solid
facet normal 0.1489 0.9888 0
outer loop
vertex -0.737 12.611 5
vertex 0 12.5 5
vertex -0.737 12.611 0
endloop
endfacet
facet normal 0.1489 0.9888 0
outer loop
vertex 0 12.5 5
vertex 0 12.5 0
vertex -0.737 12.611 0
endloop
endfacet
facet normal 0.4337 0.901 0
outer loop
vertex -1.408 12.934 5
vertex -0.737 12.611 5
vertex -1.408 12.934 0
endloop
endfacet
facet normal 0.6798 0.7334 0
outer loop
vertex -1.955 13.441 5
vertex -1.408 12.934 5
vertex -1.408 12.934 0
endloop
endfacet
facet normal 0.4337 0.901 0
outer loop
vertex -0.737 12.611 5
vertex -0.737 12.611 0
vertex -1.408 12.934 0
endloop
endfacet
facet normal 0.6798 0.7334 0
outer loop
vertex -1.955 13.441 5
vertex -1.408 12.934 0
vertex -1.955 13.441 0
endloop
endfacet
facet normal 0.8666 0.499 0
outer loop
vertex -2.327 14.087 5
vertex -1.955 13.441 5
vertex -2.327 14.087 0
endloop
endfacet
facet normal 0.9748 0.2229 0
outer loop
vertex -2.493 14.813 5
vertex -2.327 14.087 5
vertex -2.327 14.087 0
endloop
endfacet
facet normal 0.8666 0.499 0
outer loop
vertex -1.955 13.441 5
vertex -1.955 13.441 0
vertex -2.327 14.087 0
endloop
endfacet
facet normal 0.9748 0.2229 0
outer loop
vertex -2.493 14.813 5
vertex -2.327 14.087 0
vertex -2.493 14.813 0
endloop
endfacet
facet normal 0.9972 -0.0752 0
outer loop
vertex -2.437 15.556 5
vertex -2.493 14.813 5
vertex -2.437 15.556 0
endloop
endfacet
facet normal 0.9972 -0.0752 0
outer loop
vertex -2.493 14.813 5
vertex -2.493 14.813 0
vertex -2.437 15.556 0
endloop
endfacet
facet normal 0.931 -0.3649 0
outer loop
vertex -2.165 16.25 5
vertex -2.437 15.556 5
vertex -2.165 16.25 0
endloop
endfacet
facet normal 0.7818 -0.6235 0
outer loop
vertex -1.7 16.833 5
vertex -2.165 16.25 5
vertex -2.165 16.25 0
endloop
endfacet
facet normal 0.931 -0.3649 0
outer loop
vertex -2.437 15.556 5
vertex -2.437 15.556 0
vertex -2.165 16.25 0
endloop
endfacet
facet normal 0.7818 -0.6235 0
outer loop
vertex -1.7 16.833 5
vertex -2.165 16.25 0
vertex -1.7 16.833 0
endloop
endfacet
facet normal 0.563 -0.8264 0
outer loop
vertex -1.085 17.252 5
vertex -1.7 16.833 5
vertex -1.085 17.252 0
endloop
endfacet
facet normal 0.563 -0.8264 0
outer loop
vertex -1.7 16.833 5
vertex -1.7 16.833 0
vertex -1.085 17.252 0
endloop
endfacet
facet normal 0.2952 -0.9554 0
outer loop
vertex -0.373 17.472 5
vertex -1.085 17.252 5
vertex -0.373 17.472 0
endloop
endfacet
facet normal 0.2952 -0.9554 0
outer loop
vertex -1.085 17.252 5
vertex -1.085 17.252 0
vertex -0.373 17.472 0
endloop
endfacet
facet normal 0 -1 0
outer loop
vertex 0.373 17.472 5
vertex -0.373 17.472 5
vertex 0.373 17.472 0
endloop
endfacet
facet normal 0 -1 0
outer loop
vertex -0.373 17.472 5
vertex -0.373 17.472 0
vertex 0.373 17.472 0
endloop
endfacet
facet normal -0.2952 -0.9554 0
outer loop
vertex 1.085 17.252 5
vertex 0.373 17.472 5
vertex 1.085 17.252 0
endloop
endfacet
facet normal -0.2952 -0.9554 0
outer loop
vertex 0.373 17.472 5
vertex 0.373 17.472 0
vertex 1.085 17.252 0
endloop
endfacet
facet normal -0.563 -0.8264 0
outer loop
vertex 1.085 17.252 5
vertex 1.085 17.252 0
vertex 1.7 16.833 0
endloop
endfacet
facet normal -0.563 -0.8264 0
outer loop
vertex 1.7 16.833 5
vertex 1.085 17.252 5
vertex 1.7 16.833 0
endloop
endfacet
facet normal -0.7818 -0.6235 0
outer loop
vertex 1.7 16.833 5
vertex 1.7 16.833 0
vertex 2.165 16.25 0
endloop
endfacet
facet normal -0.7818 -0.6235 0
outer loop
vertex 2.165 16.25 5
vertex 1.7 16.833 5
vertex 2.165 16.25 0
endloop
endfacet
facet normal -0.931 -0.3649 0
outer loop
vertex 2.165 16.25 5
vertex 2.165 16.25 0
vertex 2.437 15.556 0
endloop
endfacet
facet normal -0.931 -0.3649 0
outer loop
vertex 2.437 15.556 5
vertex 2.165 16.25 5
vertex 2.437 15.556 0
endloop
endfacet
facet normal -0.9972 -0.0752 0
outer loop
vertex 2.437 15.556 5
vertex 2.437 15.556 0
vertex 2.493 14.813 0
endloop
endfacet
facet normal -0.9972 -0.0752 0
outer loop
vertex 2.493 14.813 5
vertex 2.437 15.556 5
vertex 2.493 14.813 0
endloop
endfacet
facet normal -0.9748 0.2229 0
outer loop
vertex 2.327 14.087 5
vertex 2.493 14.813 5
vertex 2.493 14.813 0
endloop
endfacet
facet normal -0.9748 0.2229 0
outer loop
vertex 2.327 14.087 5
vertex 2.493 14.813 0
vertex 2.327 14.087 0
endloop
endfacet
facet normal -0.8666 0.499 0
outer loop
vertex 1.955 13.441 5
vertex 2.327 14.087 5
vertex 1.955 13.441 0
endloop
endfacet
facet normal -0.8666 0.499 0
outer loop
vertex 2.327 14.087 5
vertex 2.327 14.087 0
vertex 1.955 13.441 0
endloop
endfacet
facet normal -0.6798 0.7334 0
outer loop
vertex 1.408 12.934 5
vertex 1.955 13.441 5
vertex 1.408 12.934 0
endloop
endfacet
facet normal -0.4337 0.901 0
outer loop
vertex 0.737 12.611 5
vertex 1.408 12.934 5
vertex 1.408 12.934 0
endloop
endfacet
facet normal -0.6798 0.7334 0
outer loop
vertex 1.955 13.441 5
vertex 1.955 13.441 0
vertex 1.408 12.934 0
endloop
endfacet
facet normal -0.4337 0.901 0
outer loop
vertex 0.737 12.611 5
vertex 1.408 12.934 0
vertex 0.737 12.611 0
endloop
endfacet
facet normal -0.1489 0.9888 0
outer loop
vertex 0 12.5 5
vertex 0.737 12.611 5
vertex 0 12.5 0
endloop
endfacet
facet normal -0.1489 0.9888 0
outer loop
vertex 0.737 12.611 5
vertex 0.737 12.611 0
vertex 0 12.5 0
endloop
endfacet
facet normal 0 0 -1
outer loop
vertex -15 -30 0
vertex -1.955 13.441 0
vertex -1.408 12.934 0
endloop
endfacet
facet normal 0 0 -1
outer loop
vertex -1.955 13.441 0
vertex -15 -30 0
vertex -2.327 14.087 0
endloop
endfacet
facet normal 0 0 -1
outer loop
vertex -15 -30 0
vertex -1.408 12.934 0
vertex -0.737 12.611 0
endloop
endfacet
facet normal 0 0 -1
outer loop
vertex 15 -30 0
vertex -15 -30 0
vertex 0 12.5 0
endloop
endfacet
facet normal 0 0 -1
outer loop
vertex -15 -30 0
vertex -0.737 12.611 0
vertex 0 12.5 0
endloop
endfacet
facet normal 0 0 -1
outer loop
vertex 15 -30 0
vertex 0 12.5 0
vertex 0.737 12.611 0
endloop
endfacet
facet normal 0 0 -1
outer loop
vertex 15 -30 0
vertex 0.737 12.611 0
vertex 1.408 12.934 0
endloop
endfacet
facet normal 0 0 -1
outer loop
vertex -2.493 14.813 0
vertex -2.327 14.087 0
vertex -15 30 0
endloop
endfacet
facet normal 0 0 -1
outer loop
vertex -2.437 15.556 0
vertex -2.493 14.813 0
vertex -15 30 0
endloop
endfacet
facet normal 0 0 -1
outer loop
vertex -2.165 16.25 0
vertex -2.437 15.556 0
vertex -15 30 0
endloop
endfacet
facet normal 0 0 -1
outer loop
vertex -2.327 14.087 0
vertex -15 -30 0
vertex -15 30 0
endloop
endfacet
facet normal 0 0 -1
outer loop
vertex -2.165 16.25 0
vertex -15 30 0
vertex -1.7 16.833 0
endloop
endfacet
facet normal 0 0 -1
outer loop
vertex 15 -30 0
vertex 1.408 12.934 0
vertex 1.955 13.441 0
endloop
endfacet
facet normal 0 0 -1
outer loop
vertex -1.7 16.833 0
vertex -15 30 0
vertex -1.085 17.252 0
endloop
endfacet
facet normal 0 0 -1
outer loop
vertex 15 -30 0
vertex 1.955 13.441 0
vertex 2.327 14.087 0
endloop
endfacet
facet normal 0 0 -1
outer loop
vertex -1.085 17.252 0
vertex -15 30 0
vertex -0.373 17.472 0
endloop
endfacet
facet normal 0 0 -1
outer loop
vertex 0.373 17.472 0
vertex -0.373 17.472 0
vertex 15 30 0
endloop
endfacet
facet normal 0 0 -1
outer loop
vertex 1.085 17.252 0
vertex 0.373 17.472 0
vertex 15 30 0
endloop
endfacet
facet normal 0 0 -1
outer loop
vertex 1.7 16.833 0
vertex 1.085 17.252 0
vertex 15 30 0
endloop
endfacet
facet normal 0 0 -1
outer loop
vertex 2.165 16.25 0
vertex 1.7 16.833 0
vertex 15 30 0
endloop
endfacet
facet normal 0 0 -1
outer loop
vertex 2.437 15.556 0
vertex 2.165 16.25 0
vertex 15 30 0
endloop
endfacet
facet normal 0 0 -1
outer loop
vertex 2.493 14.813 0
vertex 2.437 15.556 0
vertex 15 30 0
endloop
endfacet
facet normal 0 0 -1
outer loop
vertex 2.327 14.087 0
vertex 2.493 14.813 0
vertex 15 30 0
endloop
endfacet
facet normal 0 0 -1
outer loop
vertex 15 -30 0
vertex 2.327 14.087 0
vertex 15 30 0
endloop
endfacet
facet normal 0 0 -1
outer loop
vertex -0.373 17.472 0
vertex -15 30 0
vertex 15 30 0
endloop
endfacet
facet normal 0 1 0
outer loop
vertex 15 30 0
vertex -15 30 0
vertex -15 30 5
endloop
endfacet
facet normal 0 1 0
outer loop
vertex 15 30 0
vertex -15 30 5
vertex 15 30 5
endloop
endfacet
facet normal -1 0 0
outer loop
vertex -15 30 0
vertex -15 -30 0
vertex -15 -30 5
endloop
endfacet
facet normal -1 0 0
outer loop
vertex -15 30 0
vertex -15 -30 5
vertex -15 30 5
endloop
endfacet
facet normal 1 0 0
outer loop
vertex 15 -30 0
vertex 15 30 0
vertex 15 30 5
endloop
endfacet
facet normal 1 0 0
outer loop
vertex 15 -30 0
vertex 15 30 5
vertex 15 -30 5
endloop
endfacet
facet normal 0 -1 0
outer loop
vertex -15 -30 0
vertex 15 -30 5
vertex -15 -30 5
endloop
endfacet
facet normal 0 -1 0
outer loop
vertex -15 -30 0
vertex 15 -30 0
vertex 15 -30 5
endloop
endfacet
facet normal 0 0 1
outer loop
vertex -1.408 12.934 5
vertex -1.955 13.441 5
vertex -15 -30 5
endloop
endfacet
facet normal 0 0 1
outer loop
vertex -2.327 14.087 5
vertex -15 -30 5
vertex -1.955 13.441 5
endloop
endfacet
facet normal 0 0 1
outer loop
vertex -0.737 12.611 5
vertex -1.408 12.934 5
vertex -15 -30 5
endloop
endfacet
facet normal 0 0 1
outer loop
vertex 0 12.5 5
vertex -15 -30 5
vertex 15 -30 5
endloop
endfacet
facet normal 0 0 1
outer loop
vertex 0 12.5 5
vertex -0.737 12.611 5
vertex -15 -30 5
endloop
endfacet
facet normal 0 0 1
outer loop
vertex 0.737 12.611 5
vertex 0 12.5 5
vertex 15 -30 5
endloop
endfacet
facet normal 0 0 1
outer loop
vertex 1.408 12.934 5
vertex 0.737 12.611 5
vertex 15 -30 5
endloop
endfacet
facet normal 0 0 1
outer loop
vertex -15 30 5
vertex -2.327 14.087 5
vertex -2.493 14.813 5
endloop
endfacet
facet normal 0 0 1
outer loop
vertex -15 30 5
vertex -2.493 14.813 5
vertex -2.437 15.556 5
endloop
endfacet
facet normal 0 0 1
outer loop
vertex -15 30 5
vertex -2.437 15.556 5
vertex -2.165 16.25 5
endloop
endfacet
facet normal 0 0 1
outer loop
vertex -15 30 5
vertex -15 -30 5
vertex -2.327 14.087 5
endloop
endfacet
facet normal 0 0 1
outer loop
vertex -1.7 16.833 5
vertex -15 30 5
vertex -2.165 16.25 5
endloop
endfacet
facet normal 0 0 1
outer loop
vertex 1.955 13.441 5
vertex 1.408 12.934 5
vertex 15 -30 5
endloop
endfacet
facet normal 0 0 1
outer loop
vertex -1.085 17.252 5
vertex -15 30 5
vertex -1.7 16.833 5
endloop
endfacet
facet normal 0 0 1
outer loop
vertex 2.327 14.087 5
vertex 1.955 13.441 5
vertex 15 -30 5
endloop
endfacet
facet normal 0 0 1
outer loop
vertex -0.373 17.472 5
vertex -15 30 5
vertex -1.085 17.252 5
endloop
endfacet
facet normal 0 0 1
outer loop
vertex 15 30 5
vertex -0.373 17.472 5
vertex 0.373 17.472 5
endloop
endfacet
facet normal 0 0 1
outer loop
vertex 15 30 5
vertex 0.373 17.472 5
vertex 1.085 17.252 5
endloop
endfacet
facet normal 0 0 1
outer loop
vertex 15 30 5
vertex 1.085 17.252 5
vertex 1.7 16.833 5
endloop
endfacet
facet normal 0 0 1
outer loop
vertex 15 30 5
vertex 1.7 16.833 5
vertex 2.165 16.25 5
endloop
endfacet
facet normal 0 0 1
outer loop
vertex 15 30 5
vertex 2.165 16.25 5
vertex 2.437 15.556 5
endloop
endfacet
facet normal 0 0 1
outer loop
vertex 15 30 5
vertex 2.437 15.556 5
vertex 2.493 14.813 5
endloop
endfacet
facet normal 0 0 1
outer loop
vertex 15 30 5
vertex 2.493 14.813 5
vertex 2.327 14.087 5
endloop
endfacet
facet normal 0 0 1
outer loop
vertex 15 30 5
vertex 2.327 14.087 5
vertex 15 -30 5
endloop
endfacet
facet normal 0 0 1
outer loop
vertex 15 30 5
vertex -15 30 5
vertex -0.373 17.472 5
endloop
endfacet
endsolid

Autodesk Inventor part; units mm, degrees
ref_plane "YZ Plane" through (0, 0, 0) normal (1, 0, 0) x (0, 1, 0)
ref_plane "XZ Plane" through (0, 0, 0) normal (0, 1, 0) x (-1, 0, 0)
ref_plane "XY Plane" through (0, 0, 0) normal (0, 0, 1) x (1, 0, 0)
sketch "Sketch1" plane through (0, 0, 0) normal (0, 0, 1) x (1, 0, 0)
  line L0 (-15, 30) -> (15, 30)
  line L1 (15, 30) -> (15, -30)
  line L2 (15, -30) -> (-15, -30)
  line L3 (-15, -30) -> (-15, 30)
  point P0 (0, 0)
  dimension "d0" = 30
  dimension "d1" = 15
  dimension "d2" = 60
  dimension "d3" = 30
extrude "thickness" add sketch "Sketch1" along normal blind 5
sketch "Sketch2" plane through (0, 0, 5) normal (0, 0, 1) x (1, 0, 0)
  line L0 (-15, -30) -> (15, -30) projected
  point P0 (0, 0)
  point P1 (0, 15)
  dimension "d6" = 45
hole "Hole1" at (0, 15, 5) direction (0, 0, -1) diameter 5 end through all
equation "\"d0\" = sm_varx_squareBarDimension"
equation "\"d1\" = 0.5 * d0"
equation "\"d3\" = 0.5 * d2"
equation "\"d4\" = thickness"
equation "\"d7\" = sm_varx_pinPlate_holeDiameter"
equation "\"sm_varx_squareBarDimension\" = 30"
equation "\"thickness\" = sm_varx_pinPlate_thickness"
equation "\"hoop_angle_z\" = 45deg"
equation "\"hoop_bearing_length\" = 5deg"
equation "\"hoop_cable_diam\" = 5"
equation "\"hoop_cable_pulley_diam\" = 22"
equation "\"rack_tooth_addendum\" = 5"
equation "\"rack_tooth_dedendum\" = 5"
equation "\"rack_tooth_thickness\" = 5"
equation "\"secure_arm_angle\" = 20deg"
equation "\"secure_arm_hold_length\" = 35"
equation "\"secure_arm_radii\" = 9"
equation "\"support_baseClamp_platformLengthBuffer\" = 35"
equation "\"support_baseClamp_platformThickness\" = 15"
equation "\"support_baseClamp_platformWidthBuffer\" = 0"
equation "\"support_baseClamp_sleeveHoleDiameter\" = 12"
equation "\"support_baseClamp_sleeveSweepTerminationAngle\" = 55deg"
equation "\"support_baseClamp_thickness\" = 8"
equation "\"support_frame_endHoleBuffer\" = 25"
equation "\"support_frame_squareBarFillet\" = 2"
equation "\"support_frame_squareBarThickness\" = 5"
equation "\"hoop_tabs_thickness\" = 6"
equation "\"hoop_tabs_hole\" = 4"
equation "\"wheelchair_deployed_width\" = 635"
equation "\"wheelchair_deployed_length\" = 1067"
equation "\"wheelchair_deployed_height\" = 914"
equation "\"sm_varx_squareBarThickness\" = 2.5"
equation "\"sm_varx_pinPlate_thickness\" = 5"
equation "\"sm_varx_pinPlate_holeDiameter\" = 5"
properties part number "pinPlate" material "Steel, Galvanized"
